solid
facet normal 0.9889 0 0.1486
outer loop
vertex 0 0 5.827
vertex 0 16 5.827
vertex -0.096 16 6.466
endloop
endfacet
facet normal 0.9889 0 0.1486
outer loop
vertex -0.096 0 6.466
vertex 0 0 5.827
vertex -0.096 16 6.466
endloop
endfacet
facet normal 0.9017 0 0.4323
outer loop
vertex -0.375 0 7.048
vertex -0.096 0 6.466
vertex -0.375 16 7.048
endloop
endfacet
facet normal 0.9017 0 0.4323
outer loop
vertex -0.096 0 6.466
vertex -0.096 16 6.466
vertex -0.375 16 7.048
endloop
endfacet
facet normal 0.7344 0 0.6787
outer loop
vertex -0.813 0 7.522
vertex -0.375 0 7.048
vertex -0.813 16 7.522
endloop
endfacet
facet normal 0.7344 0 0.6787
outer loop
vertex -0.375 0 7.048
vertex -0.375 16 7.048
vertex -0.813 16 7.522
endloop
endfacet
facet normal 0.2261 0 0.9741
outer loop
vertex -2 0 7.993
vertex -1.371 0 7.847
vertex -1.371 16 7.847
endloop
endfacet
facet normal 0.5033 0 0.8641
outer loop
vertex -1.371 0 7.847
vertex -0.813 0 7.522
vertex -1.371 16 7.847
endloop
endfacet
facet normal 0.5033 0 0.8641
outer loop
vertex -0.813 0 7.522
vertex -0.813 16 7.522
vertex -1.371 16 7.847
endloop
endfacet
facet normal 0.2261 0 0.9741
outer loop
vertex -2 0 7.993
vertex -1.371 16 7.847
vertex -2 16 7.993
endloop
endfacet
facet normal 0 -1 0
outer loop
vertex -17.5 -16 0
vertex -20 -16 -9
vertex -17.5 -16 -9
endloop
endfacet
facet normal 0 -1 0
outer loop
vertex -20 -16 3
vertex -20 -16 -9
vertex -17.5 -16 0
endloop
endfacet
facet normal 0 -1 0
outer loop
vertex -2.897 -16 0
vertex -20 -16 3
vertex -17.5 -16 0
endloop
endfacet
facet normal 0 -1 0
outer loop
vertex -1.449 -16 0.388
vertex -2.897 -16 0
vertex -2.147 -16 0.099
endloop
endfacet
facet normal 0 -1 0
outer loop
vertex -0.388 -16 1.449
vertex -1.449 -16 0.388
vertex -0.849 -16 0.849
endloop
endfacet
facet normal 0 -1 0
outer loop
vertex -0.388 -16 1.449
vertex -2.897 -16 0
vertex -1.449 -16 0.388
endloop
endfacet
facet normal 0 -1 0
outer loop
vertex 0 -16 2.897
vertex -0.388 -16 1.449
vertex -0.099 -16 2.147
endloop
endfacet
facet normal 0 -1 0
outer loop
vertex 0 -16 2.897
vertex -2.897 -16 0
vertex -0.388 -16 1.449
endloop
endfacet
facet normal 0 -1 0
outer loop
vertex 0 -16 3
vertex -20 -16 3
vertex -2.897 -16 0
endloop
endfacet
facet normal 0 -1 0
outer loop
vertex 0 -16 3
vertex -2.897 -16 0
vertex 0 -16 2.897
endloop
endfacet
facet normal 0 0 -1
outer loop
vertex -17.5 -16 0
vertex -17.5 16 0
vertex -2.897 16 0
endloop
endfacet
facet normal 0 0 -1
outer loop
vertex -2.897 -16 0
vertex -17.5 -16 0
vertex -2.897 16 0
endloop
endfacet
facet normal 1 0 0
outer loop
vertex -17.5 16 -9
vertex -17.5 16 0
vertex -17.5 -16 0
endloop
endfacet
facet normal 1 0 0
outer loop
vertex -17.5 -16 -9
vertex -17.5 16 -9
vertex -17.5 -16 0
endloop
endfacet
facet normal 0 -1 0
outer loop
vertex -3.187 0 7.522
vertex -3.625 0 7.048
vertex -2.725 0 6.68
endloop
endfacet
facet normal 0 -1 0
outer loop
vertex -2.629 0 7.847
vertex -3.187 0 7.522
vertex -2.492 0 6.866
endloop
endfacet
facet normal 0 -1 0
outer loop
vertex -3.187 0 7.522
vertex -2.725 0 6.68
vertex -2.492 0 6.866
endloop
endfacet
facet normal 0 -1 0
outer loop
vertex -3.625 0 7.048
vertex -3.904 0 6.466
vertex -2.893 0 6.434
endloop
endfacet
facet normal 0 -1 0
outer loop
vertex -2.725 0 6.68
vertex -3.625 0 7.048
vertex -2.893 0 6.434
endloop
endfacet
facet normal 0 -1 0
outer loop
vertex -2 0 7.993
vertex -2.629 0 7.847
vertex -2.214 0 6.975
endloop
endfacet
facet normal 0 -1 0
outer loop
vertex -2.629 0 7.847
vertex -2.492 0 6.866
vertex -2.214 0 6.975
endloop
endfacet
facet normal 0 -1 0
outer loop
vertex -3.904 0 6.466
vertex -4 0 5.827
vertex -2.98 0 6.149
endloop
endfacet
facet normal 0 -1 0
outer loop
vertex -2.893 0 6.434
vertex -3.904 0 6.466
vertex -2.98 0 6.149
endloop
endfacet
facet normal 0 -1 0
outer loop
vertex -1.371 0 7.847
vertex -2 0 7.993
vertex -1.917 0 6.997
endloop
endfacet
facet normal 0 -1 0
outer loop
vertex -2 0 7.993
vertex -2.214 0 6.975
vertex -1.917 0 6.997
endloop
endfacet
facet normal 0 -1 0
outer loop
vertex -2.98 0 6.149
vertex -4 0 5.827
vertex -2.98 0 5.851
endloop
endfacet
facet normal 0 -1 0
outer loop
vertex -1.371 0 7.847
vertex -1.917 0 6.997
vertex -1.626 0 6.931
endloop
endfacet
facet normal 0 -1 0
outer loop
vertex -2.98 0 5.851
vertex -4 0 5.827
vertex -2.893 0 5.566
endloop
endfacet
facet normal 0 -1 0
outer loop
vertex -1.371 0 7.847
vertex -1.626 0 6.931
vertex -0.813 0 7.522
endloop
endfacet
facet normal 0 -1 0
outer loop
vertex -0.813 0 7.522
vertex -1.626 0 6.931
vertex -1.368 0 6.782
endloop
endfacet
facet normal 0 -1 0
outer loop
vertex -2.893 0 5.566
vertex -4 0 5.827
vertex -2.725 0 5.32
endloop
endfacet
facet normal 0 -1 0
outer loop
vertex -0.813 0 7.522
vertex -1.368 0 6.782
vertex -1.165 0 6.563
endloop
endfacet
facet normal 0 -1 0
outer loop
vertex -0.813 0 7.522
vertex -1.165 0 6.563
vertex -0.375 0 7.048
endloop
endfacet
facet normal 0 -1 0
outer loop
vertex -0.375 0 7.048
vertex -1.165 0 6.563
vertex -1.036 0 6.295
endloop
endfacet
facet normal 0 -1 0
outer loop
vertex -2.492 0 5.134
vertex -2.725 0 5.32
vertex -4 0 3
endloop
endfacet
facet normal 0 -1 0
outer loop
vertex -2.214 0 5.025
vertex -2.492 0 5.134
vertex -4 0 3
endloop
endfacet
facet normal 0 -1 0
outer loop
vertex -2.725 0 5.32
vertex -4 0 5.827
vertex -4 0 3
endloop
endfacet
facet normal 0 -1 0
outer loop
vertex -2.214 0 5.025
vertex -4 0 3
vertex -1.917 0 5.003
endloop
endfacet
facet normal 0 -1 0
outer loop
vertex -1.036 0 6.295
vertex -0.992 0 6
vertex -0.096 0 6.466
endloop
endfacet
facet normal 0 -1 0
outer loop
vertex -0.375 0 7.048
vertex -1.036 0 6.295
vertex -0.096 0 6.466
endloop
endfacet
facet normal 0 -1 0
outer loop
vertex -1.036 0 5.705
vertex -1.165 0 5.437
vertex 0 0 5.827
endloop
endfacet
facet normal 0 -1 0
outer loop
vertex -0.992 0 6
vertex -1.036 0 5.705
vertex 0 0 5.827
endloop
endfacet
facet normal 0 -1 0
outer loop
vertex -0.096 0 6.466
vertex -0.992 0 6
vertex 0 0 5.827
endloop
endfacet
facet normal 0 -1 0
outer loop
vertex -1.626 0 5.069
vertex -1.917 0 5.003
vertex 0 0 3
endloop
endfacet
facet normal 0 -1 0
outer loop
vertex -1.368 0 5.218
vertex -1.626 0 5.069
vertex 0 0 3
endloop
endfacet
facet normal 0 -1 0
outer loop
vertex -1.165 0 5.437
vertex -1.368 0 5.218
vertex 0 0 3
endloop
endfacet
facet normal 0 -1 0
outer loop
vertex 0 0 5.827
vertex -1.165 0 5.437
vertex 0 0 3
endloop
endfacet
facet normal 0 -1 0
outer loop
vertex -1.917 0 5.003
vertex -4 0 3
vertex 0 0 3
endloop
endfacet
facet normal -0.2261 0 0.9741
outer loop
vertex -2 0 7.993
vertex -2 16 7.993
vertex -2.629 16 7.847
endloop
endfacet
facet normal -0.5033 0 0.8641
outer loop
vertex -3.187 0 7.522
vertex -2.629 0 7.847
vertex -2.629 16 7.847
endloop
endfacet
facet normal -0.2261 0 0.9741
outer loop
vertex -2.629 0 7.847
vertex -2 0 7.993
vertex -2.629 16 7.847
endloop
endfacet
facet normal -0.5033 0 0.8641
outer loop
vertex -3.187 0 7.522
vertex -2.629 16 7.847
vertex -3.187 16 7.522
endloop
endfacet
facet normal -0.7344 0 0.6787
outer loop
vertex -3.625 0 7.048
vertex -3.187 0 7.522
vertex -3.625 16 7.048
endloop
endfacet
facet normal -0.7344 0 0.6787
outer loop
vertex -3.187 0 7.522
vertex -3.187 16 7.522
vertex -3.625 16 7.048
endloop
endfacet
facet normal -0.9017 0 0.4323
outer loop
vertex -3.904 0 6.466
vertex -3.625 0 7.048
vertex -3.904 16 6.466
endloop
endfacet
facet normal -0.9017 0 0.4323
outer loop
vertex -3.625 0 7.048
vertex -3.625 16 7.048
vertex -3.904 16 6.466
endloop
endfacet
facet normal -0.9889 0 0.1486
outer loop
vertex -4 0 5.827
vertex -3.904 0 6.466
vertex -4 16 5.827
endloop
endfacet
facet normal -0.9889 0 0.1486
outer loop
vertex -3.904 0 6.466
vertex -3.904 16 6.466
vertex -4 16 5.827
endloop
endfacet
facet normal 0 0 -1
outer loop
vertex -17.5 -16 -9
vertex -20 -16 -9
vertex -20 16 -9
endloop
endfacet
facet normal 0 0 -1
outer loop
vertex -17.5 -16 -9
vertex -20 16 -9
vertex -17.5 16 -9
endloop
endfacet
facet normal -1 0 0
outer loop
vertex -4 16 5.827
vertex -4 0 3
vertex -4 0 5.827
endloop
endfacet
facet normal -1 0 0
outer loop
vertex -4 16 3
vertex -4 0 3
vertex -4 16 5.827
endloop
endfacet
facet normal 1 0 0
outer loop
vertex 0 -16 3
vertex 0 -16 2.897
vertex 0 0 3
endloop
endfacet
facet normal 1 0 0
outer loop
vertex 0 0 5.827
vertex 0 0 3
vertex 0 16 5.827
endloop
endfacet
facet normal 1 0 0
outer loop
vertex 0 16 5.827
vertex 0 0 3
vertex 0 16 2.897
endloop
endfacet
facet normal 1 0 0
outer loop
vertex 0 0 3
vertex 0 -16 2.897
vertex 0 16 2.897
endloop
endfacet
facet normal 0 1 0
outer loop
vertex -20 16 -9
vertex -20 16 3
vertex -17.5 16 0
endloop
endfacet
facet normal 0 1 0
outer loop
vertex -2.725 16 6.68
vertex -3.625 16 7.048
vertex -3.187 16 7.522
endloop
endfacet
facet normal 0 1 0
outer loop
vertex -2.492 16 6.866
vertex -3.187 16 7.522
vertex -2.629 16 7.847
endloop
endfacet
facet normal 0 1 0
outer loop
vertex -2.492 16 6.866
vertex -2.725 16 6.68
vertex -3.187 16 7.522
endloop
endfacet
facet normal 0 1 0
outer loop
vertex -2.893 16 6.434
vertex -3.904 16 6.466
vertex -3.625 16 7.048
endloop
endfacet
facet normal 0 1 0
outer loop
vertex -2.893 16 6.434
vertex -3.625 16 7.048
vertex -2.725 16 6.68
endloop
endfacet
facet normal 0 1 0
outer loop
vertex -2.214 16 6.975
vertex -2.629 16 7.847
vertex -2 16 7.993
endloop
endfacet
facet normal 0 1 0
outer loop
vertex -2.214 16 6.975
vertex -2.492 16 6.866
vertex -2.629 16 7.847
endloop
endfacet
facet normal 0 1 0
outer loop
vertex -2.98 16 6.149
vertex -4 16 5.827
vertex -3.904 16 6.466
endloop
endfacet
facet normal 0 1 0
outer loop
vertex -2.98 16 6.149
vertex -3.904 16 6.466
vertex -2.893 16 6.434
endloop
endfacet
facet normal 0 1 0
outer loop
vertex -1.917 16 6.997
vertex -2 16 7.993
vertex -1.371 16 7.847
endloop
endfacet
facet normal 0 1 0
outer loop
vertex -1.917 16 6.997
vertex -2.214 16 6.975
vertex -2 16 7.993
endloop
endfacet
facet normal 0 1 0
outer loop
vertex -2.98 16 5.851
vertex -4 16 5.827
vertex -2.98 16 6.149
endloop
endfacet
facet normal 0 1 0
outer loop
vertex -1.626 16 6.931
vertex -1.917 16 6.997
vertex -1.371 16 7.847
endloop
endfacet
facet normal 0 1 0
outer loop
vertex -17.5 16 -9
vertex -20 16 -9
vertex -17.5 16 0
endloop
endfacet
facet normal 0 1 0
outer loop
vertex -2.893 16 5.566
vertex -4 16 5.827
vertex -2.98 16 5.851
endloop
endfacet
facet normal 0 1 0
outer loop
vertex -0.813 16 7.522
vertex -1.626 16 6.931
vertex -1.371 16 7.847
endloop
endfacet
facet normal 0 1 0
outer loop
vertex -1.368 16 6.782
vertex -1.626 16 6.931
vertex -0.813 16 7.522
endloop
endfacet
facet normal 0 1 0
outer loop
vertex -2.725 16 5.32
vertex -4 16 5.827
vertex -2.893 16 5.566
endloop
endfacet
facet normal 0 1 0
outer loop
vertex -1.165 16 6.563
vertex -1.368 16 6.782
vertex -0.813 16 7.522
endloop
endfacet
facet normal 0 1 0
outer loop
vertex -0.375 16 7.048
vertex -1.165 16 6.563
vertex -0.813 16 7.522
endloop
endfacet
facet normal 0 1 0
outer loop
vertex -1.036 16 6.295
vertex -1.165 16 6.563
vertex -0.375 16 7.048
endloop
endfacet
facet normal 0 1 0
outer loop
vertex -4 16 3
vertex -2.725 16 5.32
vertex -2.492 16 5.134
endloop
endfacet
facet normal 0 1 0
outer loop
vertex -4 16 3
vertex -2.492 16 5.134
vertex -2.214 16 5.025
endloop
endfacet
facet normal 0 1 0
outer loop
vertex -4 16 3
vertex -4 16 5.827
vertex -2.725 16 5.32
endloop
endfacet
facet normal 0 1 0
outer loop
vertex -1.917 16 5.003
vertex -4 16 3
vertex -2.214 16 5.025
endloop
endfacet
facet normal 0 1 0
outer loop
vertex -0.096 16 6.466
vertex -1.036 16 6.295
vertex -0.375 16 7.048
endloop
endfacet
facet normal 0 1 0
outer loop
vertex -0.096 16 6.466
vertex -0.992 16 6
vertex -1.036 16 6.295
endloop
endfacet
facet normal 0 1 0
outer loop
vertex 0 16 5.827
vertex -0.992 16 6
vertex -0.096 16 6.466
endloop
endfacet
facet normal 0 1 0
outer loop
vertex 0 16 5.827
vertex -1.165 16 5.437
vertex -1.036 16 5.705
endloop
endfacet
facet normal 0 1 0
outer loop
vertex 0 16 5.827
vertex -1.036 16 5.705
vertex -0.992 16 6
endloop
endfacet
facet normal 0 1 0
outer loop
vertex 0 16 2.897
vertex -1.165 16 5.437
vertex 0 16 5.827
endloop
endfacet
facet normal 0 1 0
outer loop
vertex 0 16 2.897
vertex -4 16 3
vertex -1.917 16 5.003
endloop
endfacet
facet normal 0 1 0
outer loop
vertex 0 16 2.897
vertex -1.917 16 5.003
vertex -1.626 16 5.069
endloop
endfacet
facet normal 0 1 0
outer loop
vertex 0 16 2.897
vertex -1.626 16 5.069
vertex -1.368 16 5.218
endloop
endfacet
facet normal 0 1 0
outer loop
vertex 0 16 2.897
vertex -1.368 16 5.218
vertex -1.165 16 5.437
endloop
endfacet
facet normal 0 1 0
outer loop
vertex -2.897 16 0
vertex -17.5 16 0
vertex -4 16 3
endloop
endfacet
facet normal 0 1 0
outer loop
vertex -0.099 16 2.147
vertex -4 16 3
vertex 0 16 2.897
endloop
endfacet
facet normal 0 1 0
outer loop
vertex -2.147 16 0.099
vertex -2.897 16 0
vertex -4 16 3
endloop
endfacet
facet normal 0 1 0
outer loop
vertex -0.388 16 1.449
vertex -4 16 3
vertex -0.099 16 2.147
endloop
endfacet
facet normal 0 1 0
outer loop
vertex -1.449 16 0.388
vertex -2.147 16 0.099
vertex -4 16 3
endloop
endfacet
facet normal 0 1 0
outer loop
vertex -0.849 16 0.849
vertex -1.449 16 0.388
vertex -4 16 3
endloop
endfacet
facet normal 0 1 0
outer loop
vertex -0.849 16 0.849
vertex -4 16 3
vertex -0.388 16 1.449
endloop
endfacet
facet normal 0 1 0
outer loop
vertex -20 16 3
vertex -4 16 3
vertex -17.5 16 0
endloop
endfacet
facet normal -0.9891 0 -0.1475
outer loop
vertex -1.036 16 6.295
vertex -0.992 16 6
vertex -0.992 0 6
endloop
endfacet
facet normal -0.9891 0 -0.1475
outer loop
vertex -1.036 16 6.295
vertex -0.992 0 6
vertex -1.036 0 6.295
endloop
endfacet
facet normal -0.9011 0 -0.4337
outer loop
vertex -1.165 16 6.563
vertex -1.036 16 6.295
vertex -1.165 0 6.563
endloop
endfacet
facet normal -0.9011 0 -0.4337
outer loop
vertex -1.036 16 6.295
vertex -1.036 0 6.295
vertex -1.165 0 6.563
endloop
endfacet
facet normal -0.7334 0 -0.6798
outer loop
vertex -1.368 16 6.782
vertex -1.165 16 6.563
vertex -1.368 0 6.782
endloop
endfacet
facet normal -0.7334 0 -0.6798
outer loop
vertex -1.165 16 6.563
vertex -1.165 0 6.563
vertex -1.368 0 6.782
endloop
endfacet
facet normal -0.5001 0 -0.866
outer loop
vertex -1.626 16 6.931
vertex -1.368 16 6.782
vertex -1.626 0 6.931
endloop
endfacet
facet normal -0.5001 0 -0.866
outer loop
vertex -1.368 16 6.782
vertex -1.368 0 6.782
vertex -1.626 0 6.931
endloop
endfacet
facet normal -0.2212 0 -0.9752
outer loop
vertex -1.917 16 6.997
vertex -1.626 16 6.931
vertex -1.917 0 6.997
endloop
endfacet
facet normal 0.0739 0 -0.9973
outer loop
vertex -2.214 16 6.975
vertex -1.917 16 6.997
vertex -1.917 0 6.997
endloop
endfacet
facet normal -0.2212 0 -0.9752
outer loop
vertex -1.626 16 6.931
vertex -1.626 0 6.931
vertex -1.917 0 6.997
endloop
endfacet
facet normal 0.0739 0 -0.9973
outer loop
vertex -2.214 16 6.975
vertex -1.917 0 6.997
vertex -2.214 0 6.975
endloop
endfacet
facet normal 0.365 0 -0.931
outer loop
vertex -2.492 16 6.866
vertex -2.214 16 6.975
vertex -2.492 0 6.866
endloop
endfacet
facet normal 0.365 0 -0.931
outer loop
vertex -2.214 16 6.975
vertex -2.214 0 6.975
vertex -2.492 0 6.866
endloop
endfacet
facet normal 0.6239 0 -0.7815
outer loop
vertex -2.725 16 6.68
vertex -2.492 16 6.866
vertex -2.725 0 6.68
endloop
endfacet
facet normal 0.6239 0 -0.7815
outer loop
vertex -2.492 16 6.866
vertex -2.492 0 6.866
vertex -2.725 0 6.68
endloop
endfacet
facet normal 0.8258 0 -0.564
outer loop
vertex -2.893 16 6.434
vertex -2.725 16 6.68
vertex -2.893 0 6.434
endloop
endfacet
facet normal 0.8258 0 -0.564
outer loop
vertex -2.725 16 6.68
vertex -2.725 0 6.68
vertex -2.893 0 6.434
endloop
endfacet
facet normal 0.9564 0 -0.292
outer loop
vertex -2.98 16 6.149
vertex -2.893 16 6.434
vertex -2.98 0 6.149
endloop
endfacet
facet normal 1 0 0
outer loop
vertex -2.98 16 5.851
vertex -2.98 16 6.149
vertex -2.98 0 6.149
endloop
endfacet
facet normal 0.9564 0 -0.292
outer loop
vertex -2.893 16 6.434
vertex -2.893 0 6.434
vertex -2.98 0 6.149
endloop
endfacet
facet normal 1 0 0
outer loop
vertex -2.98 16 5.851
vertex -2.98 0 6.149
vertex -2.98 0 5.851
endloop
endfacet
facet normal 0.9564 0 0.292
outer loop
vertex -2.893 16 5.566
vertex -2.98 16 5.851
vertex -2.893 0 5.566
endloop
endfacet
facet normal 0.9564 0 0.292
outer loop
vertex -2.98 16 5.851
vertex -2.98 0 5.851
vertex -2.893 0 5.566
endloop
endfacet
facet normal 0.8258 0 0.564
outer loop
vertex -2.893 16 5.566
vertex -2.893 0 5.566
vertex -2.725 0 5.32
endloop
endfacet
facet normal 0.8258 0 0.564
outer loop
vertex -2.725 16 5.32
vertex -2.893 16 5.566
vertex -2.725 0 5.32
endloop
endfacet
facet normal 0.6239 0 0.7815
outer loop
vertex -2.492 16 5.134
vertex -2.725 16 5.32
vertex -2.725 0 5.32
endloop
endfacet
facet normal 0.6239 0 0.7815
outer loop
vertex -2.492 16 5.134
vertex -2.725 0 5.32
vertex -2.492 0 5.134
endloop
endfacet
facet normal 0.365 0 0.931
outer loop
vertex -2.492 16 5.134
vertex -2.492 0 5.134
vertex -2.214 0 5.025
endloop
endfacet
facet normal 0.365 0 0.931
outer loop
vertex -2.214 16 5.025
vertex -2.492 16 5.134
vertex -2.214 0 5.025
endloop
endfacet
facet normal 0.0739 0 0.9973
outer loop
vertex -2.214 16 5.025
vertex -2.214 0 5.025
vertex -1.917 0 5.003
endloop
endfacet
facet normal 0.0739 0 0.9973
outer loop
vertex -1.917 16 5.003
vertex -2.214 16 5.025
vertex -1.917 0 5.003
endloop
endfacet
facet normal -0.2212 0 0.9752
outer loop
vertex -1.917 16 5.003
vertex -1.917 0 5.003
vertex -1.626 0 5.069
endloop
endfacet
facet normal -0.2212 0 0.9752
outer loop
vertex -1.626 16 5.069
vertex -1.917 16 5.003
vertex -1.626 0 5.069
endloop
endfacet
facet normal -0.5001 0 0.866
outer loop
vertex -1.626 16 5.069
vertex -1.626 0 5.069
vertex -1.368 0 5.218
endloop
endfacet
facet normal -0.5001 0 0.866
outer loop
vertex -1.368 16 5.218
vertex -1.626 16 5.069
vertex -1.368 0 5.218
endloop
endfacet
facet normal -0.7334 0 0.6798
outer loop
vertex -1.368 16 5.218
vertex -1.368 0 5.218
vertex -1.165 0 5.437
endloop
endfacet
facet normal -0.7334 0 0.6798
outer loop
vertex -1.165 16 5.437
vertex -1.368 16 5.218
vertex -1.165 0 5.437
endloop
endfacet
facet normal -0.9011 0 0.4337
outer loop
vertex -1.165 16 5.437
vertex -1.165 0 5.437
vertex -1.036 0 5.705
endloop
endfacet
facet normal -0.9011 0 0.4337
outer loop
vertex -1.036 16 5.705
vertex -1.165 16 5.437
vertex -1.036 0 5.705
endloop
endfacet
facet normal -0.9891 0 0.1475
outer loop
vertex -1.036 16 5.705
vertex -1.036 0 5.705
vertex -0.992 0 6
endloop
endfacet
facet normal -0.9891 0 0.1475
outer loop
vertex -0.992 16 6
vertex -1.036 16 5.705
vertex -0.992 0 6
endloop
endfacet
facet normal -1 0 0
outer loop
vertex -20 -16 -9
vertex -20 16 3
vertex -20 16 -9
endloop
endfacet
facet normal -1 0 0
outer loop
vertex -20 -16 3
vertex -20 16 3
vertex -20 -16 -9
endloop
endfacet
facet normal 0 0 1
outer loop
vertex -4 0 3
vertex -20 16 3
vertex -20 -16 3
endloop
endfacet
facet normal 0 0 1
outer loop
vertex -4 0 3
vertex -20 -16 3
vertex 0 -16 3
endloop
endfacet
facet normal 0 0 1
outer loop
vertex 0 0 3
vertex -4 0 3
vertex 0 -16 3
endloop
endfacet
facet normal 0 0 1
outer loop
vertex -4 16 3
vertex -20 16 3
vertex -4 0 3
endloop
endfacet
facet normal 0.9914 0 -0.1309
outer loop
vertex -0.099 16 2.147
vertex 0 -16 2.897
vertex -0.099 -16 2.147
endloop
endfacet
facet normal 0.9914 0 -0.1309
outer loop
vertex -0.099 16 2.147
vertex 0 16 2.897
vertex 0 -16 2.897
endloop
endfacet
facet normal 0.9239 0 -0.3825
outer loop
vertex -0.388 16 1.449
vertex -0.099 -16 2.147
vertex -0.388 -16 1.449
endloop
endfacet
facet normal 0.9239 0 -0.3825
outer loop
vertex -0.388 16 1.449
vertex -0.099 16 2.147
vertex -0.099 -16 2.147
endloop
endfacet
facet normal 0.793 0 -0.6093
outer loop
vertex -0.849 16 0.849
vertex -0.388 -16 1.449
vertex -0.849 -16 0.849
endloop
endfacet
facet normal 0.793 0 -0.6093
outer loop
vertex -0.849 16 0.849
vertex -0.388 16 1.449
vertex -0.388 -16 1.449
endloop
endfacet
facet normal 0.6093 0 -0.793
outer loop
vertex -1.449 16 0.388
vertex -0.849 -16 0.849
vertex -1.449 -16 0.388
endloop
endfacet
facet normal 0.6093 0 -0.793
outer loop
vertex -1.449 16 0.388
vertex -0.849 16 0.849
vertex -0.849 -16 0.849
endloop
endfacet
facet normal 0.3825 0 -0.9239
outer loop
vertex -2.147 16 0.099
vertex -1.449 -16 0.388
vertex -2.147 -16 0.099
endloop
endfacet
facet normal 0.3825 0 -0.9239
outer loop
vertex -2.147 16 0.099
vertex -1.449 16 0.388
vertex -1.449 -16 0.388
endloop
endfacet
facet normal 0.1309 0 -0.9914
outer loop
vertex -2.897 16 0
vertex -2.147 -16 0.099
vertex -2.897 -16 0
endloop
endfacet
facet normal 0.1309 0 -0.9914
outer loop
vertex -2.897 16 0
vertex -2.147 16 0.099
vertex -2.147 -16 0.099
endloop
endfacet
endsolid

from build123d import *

# Parameters (mm, degrees)
F0_W        = 20
F0_H        = 32
F1_DEPTH    = 3
F2_W        = 2.5
F2_H        = 32
F3_DEPTH    = 9
F4_R        = 2.8970562748
F5_W        = 4
F5_H        = 16
F6_DEPTH    = 5
F7_R        = 1
F8_DEPTH    = 25
F9_T1_DEPTH = 26.8639610307


# Not quite as in the source:
# - a fillet or chamfer that OpenCascade refuses, or shapes differently, is made with other operations: its cross-section is extruded or revolved along the edge and cut away or added


with BuildPart() as f1:
    # F0 (on Top) → F1 (new body)
    with BuildSketch(Plane.XY):
        with Locations((-10, 0)):
            Rectangle(F0_W, F0_H)
    extrude(amount=F1_DEPTH)

    # F2 (on face) → F3 (join)
    with BuildSketch(Plane(origin=(0, 0, 0), x_dir=(1, 0, 0), z_dir=(0, 0, -1))):
        with Locations((-18.75, 0)):
            Rectangle(F2_W, F2_H)
    extrude(amount=F3_DEPTH)

    # F4
    f4_edges = [f1.edges().sort_by_distance(p)[0] for p in [
        (0, 0, 0),
    ]]
    fillet(f4_edges, radius=F4_R)

    # F5 (on face) → F6 (join)
    with BuildSketch(Plane.XY.offset(3)):
        with Locations((-2, 8)):
            Rectangle(F5_W, F5_H)
    extrude(amount=F6_DEPTH)

    # F7 (on face) → F8 (cut)
    with BuildSketch(Plane.XZ):
        with Locations((-1.9916295272, 5.9999883225)):
            Circle(F7_R)
    extrude(amount=-F8_DEPTH, mode=Mode.SUBTRACT)

    # F9: fillet of radius 2.1727922061 on 2 edges, made by hand

    # F9_s2 → F9_t1 (cut)
    with BuildSketch(Plane.XZ.offset(-21.4319805153)):
        with BuildLine():
            ThreePointArc((-1.8272077939, 8), (-3.3636038969, 7.3636038969), (-4, 5.8272077939))
            Line((-4, 5.8272077939), (-4, 8))
            Line((-4, 8), (-1.8272077939, 8))
        make_face()
        with BuildLine():
            ThreePointArc((0, 5.8272077939), (-0.6363961031, 7.3636038969), (-2.1727922061, 8))
            Line((-2.1727922061, 8), (0, 8))
            Line((0, 8), (0, 5.8272077939))
        make_face()
    extrude(amount=F9_T1_DEPTH, mode=Mode.SUBTRACT)


solid = f1.part
